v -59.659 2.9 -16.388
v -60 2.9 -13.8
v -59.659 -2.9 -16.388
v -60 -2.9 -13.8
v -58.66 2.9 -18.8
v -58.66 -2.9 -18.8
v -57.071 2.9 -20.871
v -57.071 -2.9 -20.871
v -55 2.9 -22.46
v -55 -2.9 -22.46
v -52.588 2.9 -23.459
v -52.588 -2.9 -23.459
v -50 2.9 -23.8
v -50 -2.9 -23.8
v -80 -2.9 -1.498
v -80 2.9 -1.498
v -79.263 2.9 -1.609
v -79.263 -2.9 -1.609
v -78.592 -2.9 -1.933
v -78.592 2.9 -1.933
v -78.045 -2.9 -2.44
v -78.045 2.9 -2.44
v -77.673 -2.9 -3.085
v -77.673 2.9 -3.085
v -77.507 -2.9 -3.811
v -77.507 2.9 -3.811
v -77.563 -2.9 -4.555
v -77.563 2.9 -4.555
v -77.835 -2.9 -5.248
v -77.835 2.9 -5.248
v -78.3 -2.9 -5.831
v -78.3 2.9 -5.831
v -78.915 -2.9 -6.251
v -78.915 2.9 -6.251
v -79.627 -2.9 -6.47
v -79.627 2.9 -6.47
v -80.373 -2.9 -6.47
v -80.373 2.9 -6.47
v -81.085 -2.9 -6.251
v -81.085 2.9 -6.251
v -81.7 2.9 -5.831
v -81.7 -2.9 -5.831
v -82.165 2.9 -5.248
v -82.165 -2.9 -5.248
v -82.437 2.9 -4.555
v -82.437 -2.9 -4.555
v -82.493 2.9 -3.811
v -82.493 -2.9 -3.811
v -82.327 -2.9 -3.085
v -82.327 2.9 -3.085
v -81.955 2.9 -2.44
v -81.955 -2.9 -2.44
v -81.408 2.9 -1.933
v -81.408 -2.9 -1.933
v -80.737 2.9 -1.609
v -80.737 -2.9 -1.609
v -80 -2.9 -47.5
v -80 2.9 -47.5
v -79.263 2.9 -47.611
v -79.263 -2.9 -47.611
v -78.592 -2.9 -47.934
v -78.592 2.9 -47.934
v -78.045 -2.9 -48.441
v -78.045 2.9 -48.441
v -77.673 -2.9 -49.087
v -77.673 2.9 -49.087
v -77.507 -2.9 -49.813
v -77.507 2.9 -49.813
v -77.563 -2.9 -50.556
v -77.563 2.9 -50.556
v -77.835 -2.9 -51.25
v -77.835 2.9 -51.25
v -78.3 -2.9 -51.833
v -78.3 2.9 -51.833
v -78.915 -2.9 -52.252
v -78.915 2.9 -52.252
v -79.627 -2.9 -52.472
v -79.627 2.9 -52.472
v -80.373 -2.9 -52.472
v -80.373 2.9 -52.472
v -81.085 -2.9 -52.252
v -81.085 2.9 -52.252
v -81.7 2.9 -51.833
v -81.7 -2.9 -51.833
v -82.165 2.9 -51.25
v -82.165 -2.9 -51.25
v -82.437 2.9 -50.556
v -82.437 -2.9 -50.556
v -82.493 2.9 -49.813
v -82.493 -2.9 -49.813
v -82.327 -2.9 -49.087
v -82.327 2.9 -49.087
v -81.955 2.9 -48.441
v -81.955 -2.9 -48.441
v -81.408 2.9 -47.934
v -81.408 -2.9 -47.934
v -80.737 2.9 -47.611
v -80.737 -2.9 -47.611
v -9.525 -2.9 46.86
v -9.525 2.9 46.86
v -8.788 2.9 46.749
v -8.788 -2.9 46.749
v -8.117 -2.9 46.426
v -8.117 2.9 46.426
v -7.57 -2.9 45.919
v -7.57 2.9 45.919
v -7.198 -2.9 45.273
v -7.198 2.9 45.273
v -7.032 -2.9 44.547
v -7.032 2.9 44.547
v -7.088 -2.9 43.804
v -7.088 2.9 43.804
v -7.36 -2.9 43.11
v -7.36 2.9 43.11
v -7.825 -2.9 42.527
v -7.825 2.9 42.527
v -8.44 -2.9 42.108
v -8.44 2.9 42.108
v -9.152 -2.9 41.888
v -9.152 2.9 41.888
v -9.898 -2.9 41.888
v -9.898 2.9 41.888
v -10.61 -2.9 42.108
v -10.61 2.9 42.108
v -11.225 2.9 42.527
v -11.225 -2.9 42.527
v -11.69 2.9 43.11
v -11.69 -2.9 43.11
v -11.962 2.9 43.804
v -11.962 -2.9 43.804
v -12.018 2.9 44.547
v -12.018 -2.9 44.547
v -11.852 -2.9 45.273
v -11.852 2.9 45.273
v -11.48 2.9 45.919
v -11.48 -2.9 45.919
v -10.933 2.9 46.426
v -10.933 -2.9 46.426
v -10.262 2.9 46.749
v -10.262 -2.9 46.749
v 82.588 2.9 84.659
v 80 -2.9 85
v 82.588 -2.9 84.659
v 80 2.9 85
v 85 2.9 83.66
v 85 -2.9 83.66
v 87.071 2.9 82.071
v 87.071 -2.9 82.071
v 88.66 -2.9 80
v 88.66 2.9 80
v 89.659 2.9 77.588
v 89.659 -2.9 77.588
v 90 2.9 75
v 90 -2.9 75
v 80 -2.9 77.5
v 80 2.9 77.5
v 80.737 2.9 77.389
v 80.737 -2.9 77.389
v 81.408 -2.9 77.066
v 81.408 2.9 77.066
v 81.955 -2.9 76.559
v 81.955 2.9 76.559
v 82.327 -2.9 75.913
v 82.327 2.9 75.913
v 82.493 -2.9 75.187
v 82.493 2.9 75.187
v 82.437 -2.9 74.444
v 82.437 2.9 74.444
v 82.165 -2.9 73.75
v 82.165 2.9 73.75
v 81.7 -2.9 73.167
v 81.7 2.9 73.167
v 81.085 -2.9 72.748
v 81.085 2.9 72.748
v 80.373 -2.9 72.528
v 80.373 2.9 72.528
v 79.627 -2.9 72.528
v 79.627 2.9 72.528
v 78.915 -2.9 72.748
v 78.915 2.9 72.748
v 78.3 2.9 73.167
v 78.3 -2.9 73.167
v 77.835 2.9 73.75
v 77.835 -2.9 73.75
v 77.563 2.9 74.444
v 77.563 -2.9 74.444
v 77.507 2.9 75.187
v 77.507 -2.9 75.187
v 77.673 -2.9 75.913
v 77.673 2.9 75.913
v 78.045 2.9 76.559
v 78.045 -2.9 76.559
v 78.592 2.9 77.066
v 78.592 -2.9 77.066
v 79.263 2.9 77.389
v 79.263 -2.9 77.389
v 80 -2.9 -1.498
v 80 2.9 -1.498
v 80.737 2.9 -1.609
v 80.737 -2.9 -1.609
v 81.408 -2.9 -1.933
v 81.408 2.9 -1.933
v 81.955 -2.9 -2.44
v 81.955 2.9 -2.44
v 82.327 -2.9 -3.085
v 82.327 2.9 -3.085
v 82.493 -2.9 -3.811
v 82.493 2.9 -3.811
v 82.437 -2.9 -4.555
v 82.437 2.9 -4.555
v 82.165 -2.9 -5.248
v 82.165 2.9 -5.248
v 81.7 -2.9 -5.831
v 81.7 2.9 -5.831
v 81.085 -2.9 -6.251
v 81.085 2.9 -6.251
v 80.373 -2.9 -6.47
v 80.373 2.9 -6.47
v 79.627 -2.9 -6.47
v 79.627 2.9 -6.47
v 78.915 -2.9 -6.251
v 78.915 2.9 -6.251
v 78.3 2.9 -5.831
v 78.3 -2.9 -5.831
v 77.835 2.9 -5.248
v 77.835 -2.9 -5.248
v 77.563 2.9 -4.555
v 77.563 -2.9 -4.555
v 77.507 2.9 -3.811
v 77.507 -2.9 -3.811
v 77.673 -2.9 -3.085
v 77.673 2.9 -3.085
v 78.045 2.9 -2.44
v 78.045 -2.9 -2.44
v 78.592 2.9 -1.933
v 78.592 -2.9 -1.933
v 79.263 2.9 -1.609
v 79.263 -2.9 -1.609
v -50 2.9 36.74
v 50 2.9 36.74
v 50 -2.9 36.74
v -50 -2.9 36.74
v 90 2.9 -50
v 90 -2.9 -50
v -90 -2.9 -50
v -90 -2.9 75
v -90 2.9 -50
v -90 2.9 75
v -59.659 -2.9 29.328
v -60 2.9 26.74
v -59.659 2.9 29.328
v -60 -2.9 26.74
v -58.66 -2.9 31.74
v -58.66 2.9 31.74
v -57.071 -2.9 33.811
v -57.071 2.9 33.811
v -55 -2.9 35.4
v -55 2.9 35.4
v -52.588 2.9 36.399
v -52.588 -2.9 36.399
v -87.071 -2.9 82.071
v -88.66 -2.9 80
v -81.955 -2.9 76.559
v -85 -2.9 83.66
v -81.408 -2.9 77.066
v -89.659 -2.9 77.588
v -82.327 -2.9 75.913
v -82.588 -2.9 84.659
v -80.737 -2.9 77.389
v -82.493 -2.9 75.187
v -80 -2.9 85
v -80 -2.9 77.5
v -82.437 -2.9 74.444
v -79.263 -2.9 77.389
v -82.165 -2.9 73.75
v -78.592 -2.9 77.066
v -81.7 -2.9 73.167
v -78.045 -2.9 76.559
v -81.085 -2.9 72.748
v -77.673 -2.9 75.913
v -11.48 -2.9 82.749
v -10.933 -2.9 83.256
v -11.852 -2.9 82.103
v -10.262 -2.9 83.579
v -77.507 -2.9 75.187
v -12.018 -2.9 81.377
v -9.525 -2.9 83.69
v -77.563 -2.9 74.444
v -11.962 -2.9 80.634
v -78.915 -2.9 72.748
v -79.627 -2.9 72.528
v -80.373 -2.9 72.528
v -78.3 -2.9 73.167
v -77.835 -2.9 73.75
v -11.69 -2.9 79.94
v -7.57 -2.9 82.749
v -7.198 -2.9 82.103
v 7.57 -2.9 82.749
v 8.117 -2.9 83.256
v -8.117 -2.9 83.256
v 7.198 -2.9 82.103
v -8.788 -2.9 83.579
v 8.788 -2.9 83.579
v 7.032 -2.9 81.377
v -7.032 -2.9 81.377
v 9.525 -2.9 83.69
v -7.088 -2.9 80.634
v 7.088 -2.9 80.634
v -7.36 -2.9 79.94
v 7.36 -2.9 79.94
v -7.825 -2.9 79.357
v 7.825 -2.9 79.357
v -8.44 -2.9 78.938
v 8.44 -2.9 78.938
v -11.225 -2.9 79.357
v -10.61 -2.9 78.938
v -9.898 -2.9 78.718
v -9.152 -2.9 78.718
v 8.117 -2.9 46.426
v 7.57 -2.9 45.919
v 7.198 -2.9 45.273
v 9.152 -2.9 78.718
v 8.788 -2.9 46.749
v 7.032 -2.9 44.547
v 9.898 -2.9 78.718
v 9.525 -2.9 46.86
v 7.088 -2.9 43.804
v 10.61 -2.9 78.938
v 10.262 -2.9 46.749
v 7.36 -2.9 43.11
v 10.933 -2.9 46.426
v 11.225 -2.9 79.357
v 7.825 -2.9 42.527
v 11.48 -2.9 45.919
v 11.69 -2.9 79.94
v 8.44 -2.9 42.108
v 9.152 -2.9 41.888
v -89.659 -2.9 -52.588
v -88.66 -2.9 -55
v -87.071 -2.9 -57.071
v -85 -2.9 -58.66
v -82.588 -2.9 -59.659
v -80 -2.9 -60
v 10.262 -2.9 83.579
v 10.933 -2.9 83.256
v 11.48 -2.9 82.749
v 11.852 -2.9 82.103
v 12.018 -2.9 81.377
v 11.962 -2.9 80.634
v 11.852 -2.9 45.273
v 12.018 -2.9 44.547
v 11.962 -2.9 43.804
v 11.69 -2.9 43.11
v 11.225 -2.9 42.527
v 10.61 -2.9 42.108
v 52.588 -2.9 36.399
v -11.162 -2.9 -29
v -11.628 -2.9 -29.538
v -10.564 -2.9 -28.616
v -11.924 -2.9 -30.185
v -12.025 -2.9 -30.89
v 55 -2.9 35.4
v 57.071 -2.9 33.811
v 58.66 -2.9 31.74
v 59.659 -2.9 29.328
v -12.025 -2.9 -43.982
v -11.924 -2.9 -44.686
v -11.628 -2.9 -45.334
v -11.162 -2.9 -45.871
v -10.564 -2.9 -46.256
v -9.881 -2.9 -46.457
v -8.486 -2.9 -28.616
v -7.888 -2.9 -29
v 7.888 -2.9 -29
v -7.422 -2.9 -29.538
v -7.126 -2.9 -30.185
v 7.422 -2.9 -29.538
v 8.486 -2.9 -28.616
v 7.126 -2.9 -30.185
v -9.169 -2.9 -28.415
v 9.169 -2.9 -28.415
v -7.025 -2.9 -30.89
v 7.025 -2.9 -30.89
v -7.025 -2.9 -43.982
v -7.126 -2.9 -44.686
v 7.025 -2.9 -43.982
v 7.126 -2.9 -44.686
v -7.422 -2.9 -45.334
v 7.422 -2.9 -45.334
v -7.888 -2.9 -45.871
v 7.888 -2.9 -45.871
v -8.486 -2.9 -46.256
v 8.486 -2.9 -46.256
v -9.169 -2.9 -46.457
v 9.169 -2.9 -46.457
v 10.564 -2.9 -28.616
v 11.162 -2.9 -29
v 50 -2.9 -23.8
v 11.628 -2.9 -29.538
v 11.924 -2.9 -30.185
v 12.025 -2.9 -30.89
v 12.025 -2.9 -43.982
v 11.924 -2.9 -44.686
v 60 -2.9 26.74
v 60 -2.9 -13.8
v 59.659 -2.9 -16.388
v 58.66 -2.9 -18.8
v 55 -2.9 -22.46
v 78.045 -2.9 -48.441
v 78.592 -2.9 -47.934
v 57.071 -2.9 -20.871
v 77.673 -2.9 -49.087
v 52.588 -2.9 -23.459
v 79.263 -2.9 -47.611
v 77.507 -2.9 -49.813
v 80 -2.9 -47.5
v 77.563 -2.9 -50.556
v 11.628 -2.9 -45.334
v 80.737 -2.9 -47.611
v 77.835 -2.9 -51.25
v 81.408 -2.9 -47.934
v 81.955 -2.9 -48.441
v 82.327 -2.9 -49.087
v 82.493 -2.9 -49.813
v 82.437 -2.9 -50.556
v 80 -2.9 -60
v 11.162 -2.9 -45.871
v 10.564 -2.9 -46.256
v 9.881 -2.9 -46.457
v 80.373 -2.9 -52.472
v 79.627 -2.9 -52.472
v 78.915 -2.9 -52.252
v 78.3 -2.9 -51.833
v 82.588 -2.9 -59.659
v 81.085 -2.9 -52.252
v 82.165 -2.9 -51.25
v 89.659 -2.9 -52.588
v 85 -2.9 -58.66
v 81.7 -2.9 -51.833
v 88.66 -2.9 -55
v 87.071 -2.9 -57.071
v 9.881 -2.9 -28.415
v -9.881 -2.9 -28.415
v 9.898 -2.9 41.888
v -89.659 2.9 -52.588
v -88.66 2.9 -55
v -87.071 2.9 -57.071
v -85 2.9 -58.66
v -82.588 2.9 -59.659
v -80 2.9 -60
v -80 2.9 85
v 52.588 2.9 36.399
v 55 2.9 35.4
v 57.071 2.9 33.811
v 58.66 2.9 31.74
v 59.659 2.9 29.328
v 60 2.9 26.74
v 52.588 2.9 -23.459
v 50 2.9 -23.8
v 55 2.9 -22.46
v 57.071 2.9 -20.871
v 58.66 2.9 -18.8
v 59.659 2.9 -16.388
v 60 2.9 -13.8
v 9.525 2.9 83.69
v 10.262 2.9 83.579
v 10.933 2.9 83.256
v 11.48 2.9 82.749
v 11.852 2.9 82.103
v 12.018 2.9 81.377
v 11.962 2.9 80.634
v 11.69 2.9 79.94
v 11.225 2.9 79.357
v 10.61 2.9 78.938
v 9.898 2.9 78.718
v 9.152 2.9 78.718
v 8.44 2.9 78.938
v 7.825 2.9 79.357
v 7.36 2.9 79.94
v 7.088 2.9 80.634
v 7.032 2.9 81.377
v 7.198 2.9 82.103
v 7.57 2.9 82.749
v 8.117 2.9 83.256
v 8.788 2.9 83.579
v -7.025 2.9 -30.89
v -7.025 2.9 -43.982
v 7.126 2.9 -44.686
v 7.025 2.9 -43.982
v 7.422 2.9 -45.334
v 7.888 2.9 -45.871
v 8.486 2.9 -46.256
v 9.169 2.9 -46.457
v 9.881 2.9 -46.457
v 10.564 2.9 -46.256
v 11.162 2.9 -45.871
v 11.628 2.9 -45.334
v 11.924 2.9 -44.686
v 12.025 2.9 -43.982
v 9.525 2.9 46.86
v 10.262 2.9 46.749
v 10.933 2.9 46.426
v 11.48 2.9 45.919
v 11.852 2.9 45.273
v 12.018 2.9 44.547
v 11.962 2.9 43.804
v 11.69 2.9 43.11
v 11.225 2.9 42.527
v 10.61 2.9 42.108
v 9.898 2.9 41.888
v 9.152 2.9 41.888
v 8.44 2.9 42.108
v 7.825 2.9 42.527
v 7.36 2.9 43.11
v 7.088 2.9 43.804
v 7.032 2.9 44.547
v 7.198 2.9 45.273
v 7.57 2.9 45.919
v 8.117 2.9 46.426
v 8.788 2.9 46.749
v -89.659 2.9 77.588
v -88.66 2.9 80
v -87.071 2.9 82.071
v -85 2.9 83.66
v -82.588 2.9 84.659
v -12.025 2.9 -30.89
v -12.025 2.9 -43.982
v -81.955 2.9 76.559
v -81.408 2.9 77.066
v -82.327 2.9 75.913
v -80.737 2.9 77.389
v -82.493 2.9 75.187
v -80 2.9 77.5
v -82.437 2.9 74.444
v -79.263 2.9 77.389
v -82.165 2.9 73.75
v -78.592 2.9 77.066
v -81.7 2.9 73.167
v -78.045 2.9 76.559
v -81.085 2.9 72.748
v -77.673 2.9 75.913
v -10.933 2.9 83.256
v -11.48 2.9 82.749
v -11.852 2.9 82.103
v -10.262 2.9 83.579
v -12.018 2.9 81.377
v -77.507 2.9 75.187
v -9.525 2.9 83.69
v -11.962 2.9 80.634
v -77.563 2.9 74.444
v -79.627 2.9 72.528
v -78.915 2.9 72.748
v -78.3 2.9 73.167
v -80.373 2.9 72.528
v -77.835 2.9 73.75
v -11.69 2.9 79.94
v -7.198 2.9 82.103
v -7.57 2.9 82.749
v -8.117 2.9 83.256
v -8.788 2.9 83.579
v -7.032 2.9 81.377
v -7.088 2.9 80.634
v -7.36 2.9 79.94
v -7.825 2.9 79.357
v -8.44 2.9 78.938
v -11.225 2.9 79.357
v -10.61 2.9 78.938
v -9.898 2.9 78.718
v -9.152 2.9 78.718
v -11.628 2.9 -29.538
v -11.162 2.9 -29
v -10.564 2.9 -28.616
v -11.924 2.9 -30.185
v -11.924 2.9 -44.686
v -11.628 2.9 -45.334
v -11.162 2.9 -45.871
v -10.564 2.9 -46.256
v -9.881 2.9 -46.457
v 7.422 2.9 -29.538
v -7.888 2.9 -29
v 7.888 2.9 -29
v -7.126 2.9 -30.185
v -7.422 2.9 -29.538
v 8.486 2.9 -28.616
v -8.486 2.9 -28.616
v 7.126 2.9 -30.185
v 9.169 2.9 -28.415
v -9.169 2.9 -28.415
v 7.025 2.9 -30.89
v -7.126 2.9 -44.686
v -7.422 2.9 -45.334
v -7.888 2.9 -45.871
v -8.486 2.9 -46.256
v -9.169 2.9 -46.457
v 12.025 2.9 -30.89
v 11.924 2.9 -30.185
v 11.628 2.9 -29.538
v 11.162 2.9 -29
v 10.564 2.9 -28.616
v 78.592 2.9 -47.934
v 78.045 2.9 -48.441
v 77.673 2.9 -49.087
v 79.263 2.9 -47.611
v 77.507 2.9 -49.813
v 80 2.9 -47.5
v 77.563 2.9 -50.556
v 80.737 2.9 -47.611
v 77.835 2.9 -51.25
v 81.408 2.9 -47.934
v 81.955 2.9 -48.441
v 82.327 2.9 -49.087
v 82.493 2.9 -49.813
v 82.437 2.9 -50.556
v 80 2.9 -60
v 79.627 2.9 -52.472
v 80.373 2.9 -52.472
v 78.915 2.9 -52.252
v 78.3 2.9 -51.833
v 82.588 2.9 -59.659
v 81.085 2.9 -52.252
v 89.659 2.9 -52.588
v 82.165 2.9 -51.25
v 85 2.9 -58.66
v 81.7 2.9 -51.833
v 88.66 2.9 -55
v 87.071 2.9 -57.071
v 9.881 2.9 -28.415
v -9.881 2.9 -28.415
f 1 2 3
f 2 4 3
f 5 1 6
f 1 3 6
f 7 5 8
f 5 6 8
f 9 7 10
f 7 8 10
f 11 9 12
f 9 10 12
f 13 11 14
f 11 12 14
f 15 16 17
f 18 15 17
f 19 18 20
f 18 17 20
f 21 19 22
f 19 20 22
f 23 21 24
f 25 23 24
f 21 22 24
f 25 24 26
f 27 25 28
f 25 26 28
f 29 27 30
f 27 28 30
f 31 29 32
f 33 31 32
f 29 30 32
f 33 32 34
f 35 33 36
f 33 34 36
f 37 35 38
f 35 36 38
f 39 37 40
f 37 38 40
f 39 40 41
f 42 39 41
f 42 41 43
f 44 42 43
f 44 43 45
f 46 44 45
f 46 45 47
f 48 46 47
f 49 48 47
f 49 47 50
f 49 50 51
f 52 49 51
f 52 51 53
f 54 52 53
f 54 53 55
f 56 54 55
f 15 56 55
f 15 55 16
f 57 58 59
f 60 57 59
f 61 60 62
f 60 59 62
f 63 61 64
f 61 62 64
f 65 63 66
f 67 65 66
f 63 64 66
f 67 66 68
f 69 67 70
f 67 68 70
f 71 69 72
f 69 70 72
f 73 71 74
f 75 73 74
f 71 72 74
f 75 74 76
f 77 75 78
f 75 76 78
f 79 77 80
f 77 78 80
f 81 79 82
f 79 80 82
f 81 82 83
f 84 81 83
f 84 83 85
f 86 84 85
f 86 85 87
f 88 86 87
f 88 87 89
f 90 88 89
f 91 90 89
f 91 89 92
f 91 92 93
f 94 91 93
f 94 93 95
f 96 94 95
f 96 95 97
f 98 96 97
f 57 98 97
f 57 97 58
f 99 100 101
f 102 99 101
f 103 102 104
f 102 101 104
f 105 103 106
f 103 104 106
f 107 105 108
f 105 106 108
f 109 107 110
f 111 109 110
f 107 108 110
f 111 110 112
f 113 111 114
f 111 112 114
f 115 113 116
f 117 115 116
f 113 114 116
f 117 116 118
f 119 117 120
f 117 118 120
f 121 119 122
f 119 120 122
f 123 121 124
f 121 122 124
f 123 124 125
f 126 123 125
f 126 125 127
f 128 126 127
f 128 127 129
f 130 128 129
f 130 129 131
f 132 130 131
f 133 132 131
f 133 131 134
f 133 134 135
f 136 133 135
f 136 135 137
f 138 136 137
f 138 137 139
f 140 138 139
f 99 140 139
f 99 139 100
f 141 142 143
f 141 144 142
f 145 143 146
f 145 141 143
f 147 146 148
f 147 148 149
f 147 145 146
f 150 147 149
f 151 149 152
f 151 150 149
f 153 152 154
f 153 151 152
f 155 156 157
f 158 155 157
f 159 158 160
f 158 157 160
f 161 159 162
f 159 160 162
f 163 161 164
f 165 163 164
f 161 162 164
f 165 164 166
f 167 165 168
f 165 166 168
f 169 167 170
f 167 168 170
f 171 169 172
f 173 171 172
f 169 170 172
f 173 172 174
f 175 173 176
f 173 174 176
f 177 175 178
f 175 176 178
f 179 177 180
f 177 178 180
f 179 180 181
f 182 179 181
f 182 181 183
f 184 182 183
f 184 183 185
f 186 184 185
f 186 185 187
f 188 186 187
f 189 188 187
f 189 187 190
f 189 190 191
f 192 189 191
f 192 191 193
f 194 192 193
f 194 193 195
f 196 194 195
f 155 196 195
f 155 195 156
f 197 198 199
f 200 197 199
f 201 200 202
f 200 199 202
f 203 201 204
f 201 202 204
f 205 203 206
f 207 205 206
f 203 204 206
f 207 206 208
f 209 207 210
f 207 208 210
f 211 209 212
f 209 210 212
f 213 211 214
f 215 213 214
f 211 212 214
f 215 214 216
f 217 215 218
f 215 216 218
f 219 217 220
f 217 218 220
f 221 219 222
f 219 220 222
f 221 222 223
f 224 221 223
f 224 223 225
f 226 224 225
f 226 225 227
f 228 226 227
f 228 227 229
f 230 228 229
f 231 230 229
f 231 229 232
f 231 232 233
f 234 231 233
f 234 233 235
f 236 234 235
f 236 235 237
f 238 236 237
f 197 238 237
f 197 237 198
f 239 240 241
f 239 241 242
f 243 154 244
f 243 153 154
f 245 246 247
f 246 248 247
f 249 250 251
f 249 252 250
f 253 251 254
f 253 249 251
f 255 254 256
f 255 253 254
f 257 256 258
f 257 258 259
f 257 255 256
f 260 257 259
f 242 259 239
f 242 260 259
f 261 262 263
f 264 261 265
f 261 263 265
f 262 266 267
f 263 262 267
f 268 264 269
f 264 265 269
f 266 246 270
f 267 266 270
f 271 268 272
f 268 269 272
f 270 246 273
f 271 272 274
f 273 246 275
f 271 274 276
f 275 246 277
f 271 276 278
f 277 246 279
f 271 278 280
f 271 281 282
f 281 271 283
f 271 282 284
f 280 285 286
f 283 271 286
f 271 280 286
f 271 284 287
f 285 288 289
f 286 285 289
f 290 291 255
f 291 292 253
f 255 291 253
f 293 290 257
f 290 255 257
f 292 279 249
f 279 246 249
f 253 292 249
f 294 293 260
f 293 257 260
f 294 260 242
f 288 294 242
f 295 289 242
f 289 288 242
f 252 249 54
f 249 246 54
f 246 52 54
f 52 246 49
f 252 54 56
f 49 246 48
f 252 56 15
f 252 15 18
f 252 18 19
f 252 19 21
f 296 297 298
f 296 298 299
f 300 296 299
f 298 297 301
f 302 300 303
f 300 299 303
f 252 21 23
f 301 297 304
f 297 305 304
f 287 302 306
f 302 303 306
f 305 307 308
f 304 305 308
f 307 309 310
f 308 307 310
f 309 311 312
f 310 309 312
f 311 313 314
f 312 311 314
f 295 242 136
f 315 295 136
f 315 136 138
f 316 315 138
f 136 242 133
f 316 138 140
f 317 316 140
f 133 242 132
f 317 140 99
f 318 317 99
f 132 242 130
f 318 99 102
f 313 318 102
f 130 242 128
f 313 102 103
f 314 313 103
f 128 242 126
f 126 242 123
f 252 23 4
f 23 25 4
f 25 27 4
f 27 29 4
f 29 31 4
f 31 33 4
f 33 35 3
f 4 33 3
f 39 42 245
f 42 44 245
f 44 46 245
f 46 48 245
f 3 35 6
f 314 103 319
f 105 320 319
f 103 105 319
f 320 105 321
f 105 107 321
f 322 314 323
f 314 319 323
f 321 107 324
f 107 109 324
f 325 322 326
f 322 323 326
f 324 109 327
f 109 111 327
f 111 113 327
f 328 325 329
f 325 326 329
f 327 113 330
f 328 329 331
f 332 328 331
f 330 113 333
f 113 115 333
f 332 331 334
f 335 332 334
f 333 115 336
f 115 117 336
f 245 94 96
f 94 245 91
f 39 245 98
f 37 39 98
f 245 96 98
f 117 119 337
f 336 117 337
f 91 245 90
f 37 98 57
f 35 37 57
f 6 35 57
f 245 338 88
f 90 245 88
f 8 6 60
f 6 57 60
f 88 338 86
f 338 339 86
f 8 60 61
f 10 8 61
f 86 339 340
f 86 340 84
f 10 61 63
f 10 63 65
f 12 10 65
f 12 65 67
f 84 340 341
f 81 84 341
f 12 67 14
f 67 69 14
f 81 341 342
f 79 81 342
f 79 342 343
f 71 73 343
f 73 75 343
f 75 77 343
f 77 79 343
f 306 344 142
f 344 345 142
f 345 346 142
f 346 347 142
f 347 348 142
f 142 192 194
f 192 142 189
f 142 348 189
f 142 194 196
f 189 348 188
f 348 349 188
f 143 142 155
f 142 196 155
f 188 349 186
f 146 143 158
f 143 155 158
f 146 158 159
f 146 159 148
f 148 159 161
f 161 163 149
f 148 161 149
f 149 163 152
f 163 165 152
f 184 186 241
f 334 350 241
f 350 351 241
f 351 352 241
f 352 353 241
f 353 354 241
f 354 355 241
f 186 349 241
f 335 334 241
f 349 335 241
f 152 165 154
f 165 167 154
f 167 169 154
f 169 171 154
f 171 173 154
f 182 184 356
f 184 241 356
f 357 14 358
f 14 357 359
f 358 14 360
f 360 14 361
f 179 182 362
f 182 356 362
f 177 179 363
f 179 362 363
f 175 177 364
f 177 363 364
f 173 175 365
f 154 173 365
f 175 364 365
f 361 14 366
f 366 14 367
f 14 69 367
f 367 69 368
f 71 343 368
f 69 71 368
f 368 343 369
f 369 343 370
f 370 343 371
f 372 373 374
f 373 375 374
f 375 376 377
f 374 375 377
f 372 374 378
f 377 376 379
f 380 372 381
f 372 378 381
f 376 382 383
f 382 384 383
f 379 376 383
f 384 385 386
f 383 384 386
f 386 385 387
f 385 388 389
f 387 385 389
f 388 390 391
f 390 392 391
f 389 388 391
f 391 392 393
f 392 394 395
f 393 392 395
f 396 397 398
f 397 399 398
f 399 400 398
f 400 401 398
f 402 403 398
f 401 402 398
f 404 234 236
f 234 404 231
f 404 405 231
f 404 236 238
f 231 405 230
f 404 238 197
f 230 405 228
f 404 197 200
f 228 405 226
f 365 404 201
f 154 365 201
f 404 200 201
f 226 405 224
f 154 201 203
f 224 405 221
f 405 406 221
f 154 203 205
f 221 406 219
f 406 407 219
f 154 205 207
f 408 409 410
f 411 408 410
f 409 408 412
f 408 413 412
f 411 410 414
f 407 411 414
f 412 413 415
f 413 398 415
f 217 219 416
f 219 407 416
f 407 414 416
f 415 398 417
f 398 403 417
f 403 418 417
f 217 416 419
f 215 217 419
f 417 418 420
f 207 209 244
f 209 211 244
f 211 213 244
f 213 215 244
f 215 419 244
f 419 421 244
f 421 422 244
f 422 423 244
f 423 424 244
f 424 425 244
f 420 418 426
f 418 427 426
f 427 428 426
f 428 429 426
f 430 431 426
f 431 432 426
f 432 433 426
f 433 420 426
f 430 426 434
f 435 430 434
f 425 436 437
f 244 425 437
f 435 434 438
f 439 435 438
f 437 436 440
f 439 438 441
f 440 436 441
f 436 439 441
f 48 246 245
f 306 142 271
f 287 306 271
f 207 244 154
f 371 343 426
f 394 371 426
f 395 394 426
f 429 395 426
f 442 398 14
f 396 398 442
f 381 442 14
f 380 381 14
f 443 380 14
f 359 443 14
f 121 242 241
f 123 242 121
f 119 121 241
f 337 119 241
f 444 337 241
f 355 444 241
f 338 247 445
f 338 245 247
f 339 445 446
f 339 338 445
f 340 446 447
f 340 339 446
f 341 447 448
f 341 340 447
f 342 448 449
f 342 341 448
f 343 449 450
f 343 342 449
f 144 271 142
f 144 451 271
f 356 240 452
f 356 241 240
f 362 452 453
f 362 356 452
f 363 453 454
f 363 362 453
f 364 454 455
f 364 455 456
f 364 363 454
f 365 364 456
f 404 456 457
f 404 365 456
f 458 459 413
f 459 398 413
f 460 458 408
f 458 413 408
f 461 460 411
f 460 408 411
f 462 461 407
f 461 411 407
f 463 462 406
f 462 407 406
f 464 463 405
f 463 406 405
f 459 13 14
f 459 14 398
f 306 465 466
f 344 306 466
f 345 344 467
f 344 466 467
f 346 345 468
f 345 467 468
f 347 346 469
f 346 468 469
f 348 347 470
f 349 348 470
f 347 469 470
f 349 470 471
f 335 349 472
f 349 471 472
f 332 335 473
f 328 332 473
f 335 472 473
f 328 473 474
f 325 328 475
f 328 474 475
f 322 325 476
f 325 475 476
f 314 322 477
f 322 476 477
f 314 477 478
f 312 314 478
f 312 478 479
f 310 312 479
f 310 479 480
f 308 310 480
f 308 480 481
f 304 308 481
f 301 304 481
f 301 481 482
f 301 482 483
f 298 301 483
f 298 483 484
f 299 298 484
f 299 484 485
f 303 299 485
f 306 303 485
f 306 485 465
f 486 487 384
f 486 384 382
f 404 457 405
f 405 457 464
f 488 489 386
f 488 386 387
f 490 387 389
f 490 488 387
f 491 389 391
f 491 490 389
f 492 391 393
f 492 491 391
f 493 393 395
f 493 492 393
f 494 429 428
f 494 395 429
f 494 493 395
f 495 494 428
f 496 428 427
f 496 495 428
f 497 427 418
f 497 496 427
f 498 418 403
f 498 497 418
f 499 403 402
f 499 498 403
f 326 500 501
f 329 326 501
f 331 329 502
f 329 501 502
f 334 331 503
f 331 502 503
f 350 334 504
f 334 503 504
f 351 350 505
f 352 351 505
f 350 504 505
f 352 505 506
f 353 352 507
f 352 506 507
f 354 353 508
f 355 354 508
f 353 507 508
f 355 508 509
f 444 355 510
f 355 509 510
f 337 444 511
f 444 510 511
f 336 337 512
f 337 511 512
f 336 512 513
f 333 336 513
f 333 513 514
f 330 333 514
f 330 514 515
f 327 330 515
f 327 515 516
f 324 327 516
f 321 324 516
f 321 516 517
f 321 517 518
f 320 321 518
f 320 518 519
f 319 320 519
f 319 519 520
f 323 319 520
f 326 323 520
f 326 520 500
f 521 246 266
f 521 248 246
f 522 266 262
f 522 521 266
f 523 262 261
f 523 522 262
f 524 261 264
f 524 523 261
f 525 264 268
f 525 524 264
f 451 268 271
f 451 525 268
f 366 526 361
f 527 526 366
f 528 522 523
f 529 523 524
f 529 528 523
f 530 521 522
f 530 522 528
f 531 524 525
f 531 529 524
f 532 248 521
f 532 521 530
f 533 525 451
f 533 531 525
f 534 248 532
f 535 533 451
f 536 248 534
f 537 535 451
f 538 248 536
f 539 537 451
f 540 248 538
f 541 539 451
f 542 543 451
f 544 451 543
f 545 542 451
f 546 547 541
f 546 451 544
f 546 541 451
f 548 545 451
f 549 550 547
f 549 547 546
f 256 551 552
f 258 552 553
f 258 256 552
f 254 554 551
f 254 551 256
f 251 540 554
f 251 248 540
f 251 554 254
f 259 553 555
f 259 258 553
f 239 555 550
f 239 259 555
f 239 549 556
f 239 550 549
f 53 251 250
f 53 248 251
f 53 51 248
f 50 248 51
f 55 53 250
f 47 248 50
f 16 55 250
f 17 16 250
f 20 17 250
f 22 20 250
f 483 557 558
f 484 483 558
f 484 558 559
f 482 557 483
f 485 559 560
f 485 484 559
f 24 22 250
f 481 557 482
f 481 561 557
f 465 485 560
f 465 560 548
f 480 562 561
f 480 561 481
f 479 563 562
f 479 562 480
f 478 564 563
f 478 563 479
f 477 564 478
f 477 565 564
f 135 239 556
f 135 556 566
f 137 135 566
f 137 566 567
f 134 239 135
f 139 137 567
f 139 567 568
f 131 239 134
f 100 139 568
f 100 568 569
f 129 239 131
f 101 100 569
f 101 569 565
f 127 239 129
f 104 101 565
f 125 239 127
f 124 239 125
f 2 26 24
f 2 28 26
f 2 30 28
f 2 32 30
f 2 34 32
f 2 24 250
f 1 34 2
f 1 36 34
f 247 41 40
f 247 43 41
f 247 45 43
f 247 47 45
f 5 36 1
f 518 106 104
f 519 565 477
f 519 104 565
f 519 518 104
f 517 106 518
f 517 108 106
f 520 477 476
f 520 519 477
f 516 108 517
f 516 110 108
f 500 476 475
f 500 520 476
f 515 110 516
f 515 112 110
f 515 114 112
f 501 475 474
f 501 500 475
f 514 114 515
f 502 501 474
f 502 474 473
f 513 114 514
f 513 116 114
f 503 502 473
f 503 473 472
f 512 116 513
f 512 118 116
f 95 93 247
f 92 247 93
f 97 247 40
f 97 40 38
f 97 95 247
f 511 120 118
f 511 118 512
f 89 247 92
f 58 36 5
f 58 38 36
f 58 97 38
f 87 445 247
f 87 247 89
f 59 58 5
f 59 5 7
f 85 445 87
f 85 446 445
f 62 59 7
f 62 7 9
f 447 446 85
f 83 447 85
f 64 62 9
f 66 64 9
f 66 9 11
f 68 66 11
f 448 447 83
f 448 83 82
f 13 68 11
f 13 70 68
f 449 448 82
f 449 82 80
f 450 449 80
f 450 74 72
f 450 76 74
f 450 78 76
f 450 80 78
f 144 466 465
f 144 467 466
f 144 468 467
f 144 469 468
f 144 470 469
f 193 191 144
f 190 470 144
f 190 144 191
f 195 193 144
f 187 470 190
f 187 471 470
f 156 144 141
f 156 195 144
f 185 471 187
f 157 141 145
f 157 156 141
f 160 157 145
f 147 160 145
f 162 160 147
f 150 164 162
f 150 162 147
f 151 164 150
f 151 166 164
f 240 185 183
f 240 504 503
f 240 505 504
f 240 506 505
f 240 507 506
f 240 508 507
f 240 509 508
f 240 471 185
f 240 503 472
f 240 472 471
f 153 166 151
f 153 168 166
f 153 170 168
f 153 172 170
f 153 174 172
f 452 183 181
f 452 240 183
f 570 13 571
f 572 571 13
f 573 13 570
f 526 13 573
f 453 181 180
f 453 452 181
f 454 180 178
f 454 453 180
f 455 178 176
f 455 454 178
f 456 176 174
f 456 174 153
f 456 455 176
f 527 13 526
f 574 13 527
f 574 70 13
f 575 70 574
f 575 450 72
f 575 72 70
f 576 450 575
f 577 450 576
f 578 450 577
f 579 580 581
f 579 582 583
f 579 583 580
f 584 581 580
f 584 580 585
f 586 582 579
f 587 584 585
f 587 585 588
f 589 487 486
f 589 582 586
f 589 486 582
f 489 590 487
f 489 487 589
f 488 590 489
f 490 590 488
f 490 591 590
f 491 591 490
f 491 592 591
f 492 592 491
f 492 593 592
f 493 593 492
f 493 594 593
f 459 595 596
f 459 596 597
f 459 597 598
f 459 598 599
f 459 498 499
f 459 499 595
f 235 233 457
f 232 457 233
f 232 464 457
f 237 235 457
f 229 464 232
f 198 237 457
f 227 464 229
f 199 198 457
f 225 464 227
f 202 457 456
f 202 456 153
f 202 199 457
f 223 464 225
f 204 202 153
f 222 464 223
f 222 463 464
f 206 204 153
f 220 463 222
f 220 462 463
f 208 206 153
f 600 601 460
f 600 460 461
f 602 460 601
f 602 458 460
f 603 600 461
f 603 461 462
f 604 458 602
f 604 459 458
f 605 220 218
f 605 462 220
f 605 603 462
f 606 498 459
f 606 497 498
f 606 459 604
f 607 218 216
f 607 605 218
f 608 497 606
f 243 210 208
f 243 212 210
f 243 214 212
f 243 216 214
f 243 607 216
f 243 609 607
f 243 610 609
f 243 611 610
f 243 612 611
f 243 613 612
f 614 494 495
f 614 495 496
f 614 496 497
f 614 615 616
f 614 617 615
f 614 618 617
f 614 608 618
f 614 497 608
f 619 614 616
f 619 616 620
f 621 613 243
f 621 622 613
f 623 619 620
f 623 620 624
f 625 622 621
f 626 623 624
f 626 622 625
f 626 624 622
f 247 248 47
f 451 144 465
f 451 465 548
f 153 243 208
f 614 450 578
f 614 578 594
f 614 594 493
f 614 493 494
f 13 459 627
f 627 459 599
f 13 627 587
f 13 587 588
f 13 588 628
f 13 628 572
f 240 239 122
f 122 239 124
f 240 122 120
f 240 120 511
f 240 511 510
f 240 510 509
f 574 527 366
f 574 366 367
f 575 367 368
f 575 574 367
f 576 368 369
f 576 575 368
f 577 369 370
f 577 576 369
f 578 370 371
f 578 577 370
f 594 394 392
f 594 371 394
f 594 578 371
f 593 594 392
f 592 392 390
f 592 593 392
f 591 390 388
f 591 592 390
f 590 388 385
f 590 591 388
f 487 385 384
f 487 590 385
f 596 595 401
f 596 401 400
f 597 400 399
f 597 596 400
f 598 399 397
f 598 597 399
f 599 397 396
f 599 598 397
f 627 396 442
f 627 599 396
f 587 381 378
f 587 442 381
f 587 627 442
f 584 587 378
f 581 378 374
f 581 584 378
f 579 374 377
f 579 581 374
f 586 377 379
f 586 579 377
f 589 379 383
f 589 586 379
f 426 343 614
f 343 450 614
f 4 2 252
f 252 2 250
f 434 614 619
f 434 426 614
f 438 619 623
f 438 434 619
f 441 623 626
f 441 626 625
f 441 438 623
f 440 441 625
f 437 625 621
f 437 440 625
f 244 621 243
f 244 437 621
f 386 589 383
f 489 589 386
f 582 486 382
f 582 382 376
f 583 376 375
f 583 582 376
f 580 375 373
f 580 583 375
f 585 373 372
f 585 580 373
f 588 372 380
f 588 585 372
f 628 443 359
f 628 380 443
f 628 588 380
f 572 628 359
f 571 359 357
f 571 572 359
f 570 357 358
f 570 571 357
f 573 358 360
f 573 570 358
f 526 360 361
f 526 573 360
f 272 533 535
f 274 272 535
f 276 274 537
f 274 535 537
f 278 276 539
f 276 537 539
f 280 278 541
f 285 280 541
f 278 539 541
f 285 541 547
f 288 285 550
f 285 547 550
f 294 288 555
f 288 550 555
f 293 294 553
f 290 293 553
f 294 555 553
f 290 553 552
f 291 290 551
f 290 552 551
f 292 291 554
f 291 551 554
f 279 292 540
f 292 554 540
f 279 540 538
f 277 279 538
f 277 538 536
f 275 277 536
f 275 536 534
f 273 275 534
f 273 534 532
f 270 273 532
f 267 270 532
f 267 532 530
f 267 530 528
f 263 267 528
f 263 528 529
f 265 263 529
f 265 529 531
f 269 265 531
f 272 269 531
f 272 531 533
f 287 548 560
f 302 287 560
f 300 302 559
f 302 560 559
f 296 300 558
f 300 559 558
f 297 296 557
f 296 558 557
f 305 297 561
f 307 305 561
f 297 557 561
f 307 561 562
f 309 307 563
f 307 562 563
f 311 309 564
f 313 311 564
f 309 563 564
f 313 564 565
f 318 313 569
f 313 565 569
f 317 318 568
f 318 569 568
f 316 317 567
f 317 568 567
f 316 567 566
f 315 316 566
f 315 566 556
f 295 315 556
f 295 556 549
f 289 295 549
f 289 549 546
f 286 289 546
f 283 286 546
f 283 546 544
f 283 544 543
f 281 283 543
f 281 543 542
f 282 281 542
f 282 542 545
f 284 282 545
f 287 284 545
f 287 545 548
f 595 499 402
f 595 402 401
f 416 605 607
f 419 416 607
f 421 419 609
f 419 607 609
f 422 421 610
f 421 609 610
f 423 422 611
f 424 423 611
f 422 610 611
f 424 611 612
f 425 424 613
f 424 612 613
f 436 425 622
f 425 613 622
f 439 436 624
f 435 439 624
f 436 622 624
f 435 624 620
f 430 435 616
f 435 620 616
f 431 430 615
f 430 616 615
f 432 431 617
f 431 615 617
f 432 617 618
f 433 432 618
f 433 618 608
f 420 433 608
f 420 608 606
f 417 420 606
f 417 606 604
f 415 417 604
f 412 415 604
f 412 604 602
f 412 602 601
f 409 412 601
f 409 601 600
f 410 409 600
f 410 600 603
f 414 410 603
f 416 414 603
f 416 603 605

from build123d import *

# Parameters (mm, degrees)
SKETCH1_W           = 180
SKETCH1_H           = 145
BOSS_EXTRUDE1_DEPTH = 2.9
CUT_EXTRUDE1_DEPTH  = 124.929980231
SKETCH3_R           = 2.5
CUT_EXTRUDE2_DEPTH  = 124.929980231
SKETCH4_R           = 2.5
CUT_EXTRUDE3_DEPTH  = 124.929980231
FILLET1_R           = 10


with BuildPart() as part:
    # Sketch1 → Boss-Extrude1 (new, symmetric)
    with BuildSketch(Plane(origin=(0, 0, 0), x_dir=(1, 0, 0), z_dir=(0, 1, 0))):
        with Locations((0, -12.5)):
            Rectangle(SKETCH1_W, SKETCH1_H)
    extrude(amount=BOSS_EXTRUDE1_DEPTH, both=True)

    # Sketch2 → Cut-Extrude1 (cut, through all)
    with BuildSketch(Plane(origin=(0, 2.9, 0), x_dir=(1, 0, 0), z_dir=(0, 1, 0))):
        Polygon((-60, 23.8), (60, 23.8), (60, -23.8), (60, -36.74), (-60, -36.74), (-60, -23.8), align=None)
    extrude(amount=-CUT_EXTRUDE1_DEPTH, mode=Mode.SUBTRACT)

    # Sketch3 → Cut-Extrude2 (cut, through all)
    with BuildSketch(Plane(origin=(0, 2.9, 0), x_dir=(1, 0, 0), z_dir=(0, 1, 0))):
        with Locations(Location((-9.525, -44.36, 0), (0, 0, 270))):
            Circle(SKETCH3_R)
        with Locations(Location((9.525, -44.36, 0), (0, 0, 270))):
            Circle(SKETCH3_R)
        with Locations(Location((-9.525, -81.19, 0), (0, 0, 270))):
            Circle(SKETCH3_R)
        with Locations(Location((9.525, -81.19, 0), (0, 0, 270))):
            Circle(SKETCH3_R)
        with BuildLine():
            Line((-12.025, 30.889667183), (-12.025, 43.982098817))
            ThreePointArc((-12.025, 43.982098817), (-9.525, 46.482098817), (-7.025, 43.982098817))
            Line((-7.025, 43.982098817), (-7.025, 30.889667183))
            ThreePointArc((-7.025, 30.889667183), (-9.525, 28.389667183), (-12.025, 30.889667183))
        make_face()
        with BuildLine():
            Line((7.025, 30.889667183), (7.025, 43.982098817))
            ThreePointArc((7.025, 43.982098817), (9.525, 46.482098817), (12.025, 43.982098817))
            Line((12.025, 43.982098817), (12.025, 30.889667183))
            ThreePointArc((12.025, 30.889667183), (9.525, 28.389667183), (7.025, 30.889667183))
        make_face()
    extrude(amount=-CUT_EXTRUDE2_DEPTH, mode=Mode.SUBTRACT)

    # Sketch4 → Cut-Extrude3 (cut, through all)
    with BuildSketch(Plane(origin=(0, 2.9, 0), x_dir=(1, 0, 0), z_dir=(0, 1, 0))):
        with Locations(Location((-80, 50, 0), (0, 0, 270))):
            Circle(SKETCH4_R)
        with Locations(Location((-80, 3.99826174, 0), (0, 0, 270))):
            Circle(SKETCH4_R)
        with Locations(Location((-80, -75, 0), (0, 0, 270))):
            Circle(SKETCH4_R)
        with Locations(Location((80, -75, 0), (0, 0, 270))):
            Circle(SKETCH4_R)
        with Locations(Location((80, 3.99826174, 0), (0, 0, 270))):
            Circle(SKETCH4_R)
        with Locations(Location((80, 50, 0), (0, 0, 270))):
            Circle(SKETCH4_R)
    extrude(amount=-CUT_EXTRUDE3_DEPTH, mode=Mode.SUBTRACT)

    # Fillet1
    fillet1_edges = [part.edges().sort_by_distance(p)[0] for p in [
        (-60, 0, -23.8),
        (60, 0, -23.8),
        (60, 0, 36.74),
        (-60, 0, 36.74),
        (90, 0, 85),
        (-90, 0, 85),
        (-90, 0, -60),
        (90, 0, -60),
    ]]
    fillet(fillet1_edges, radius=FILLET1_R)


solid = part.part
